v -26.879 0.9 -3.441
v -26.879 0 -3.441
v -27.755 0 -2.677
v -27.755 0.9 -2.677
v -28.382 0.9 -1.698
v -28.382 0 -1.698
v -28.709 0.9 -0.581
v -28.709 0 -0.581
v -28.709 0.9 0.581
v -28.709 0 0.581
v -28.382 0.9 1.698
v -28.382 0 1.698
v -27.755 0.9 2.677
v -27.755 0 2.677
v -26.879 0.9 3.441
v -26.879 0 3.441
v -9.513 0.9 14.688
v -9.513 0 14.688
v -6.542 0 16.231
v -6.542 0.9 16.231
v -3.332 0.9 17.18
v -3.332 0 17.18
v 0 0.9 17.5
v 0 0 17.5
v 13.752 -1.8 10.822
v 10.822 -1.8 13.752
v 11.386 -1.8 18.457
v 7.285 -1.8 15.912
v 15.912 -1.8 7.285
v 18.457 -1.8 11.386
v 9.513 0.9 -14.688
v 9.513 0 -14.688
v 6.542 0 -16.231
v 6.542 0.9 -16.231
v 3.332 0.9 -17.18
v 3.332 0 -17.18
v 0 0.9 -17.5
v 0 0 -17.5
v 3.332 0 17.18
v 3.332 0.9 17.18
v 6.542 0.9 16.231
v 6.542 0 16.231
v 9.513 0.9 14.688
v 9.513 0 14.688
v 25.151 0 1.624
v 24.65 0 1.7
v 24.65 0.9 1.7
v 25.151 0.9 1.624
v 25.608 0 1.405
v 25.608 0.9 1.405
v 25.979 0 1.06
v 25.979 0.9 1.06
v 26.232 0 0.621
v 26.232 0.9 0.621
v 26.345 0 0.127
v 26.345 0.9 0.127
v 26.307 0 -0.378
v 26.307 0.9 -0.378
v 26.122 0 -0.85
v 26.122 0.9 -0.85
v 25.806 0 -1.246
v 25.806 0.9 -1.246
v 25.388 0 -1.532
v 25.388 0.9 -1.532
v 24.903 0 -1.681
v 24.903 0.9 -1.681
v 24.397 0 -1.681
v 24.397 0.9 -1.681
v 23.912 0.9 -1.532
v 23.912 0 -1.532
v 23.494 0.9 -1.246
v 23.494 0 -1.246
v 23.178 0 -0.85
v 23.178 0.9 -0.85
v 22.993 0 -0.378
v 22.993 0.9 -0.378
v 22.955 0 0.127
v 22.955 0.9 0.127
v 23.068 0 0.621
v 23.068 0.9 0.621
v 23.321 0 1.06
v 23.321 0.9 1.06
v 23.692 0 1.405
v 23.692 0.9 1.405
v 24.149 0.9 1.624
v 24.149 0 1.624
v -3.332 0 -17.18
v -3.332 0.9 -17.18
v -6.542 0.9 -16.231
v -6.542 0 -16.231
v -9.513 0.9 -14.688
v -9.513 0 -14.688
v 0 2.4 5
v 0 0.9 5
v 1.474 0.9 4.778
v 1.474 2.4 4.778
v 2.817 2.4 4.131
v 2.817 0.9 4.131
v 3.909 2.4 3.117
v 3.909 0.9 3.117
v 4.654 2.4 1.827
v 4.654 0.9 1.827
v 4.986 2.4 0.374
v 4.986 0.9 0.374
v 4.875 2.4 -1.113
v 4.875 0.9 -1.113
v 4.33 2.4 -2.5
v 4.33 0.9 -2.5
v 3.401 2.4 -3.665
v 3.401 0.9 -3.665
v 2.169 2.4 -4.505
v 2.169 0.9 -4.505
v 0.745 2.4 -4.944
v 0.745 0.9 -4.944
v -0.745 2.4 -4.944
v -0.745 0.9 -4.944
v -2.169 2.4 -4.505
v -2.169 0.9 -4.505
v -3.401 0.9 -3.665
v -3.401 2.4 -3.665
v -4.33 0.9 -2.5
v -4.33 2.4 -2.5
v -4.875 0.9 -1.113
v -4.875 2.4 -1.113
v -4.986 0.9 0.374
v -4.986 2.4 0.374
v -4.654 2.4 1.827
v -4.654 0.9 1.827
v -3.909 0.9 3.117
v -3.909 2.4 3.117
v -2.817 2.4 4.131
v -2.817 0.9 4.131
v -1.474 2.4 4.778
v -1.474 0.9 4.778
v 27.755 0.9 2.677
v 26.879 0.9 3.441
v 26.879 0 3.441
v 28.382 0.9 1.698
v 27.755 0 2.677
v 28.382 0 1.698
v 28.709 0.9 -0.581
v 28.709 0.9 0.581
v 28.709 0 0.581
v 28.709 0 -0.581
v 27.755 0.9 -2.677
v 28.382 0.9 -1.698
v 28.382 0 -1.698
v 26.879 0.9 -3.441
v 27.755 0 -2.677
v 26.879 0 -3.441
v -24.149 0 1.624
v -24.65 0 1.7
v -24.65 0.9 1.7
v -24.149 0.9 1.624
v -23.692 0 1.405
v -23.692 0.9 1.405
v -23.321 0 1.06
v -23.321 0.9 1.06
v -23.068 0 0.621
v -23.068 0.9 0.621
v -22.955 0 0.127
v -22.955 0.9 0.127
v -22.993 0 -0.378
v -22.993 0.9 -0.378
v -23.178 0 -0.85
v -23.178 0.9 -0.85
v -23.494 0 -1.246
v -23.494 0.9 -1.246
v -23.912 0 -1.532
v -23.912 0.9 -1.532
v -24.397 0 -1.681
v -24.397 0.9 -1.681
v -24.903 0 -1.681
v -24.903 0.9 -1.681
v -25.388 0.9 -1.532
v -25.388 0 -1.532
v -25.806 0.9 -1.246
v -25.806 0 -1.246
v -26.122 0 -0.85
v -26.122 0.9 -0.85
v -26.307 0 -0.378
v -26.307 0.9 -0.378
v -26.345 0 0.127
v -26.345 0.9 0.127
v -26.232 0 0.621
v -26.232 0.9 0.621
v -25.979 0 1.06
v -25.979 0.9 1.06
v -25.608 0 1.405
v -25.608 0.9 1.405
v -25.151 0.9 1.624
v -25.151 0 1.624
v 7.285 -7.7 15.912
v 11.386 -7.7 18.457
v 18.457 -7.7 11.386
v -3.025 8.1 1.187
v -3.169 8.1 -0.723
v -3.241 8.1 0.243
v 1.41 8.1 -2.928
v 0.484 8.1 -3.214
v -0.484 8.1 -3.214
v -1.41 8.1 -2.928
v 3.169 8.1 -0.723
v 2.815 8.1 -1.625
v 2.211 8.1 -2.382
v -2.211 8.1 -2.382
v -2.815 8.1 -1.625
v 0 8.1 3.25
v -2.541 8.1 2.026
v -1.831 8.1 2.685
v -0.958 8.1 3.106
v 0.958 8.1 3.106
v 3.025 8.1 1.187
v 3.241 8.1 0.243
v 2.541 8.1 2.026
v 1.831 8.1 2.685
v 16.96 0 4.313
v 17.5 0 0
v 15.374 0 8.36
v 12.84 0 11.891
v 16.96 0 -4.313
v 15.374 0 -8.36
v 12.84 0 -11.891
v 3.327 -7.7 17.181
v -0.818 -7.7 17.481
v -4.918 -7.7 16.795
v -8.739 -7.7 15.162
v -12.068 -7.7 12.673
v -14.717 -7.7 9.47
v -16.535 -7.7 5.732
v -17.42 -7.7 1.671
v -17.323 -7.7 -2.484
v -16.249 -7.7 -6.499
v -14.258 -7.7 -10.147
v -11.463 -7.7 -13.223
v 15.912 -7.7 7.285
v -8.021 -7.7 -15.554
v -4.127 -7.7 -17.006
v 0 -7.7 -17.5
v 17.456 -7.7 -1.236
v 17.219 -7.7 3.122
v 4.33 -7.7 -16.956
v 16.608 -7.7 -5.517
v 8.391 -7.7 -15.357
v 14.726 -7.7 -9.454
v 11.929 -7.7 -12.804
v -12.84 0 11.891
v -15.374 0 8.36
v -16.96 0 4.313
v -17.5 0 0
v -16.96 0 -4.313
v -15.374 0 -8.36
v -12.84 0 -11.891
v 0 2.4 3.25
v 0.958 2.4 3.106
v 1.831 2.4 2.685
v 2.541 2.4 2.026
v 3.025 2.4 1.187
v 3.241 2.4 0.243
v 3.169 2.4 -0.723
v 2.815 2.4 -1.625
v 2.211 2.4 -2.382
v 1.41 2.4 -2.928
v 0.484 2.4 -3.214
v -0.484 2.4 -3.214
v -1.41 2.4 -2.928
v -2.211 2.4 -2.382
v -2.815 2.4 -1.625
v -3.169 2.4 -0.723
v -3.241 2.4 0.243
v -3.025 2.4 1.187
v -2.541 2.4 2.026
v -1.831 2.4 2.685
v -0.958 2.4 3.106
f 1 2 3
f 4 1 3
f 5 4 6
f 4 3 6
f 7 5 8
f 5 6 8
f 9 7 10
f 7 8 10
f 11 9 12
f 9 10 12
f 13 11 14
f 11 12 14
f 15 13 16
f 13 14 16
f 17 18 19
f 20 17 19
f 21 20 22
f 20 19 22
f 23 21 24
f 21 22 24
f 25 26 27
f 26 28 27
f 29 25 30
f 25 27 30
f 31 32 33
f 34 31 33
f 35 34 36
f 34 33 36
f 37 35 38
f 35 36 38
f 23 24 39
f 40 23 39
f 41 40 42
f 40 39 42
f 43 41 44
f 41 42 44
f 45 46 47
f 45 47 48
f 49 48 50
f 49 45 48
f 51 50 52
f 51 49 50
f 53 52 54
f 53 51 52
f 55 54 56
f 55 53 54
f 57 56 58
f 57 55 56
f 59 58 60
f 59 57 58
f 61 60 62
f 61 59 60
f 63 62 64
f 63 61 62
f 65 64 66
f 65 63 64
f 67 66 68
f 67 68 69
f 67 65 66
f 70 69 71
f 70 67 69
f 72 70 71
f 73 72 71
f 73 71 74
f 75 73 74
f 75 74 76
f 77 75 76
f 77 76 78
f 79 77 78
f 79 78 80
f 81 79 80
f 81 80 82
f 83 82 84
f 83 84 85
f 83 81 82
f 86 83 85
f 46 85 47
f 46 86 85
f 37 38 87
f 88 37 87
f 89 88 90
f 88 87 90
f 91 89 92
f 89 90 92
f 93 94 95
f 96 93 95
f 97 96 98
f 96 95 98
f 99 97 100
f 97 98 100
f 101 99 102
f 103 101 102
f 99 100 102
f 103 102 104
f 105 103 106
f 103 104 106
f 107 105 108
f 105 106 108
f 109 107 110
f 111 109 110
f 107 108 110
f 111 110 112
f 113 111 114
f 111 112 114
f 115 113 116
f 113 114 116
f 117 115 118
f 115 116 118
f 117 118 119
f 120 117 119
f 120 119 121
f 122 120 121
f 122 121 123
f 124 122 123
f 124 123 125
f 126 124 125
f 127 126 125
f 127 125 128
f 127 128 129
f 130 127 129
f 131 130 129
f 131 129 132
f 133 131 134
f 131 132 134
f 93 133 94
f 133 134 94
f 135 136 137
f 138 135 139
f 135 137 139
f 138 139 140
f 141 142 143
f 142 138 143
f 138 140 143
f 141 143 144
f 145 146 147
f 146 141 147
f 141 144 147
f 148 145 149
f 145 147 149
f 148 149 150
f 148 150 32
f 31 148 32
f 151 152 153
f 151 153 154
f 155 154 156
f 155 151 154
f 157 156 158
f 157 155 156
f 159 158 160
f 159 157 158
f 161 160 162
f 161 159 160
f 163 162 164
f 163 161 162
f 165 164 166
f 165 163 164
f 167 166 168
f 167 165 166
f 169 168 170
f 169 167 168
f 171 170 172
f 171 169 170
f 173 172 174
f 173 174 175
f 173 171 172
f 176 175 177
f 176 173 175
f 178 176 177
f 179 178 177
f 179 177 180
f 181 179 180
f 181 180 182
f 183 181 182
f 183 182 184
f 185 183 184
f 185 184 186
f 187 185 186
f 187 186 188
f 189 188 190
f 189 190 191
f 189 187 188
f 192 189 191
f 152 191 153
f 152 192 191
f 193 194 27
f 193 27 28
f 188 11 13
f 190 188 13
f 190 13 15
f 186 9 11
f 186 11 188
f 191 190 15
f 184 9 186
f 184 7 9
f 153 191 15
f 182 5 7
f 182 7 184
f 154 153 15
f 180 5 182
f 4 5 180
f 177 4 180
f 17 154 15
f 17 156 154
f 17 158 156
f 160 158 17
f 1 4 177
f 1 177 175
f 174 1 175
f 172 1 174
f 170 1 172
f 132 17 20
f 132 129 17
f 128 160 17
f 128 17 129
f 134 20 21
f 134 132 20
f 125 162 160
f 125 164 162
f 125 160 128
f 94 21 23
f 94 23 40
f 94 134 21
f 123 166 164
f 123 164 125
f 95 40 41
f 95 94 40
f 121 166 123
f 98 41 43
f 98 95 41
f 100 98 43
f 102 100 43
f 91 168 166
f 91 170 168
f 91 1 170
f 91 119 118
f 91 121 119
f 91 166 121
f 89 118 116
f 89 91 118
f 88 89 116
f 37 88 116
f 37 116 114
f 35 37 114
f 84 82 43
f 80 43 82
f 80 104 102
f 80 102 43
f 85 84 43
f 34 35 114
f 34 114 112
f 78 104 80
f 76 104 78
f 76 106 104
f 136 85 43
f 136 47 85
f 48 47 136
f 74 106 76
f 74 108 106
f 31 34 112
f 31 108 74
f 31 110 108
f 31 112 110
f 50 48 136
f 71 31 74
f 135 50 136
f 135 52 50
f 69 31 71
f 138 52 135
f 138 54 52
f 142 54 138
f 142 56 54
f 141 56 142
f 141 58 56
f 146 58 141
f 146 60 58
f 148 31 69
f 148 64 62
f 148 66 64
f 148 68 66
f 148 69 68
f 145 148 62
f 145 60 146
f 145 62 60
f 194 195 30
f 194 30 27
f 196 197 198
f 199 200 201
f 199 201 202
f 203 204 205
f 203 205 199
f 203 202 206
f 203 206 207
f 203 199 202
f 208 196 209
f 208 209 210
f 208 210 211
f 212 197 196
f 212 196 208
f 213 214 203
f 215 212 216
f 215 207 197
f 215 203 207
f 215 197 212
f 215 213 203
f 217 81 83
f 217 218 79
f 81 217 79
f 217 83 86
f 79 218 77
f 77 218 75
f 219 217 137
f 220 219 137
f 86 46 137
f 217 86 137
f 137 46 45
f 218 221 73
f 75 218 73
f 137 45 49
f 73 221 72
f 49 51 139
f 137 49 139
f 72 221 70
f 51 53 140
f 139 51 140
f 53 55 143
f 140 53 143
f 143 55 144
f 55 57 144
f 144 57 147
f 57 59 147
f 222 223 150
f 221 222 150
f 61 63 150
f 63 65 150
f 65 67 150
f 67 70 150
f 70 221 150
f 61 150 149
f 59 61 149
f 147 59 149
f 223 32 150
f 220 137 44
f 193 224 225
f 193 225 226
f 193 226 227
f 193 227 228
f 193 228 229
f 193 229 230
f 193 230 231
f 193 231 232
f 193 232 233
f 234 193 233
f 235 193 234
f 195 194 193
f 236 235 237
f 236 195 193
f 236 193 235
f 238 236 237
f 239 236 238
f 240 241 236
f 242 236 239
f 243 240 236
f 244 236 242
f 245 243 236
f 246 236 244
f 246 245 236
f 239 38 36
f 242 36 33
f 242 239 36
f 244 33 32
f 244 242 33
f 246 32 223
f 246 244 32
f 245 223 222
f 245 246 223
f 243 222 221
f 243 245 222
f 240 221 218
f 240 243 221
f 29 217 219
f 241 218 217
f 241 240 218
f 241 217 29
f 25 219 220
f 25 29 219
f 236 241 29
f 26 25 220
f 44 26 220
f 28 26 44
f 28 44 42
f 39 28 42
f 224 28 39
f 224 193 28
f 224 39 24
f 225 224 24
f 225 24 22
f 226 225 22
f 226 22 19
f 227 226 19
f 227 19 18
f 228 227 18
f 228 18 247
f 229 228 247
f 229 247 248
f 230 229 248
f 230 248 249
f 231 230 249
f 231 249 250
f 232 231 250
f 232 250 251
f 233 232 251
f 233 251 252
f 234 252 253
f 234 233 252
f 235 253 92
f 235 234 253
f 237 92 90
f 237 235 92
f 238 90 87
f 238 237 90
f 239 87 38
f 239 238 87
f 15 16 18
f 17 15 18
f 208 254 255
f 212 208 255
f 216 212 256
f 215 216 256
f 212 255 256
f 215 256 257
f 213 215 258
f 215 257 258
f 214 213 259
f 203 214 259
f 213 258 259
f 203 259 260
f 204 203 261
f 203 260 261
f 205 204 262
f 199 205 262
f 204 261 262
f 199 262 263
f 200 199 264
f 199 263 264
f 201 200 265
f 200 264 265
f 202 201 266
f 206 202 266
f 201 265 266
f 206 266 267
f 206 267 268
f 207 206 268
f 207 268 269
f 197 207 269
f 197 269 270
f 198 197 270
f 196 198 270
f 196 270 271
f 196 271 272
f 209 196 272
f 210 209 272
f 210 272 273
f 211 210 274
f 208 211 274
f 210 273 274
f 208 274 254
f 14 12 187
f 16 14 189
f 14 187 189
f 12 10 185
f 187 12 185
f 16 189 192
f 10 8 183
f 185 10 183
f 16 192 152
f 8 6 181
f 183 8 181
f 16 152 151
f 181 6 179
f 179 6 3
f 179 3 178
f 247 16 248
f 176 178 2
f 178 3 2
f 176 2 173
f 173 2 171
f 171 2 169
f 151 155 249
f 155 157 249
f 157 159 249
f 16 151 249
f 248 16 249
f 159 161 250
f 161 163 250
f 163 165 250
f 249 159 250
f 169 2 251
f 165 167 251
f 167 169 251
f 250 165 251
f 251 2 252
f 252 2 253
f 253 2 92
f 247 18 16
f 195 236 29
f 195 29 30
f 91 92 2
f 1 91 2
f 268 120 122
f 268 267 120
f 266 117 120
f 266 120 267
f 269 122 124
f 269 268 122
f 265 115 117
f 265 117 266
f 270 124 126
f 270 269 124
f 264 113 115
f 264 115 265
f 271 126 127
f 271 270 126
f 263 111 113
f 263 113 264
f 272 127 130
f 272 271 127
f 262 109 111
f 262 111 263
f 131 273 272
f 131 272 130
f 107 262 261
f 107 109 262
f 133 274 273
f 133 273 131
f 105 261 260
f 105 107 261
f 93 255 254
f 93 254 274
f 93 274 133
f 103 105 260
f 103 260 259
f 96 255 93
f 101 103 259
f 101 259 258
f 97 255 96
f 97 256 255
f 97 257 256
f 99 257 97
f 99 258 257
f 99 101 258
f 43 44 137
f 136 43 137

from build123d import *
from build123d.topology import SkipClean

# Parameters (mm, degrees)
SKETCH1_R      = 4.1
SKETCH1_R_2    = 1.7
EXTRUDE1_DEPTH = 0.9
EXTRUDE2_START = 7.7
SKETCH2_R      = 17.5
EXTRUDE2_DEPTH = 7.7
SKETCH3_R      = 5
EXTRUDE3_DEPTH = 1.5
SKETCH4_R      = 3.25
EXTRUDE4_DEPTH = 5.7
EXTRUDE5_DEPTH = 5.9


with BuildPart() as part:
    # Sketch1 → Extrude1 (new body)
    # profile 1 of 8: a face of its own
    with BuildSketch(Plane(origin=(0, 0, 0), x_dir=(1, 0, 0), z_dir=(0, 1, 0))):
        with BuildLine():
            ThreePointArc((-9.513184584, -14.688407642), (-17.5, 0), (-9.513184584, 14.688407642))
            Line((-9.513184584, 14.688407642), (-26.878803245, 3.441284076))
            ThreePointArc((-26.878803245, 3.441284076), (-22.691441002, 3.601950396), (-20.55, 0))
            ThreePointArc((-20.55, 0), (-22.691441002, -3.601950396), (-26.878803245, -3.441284076))
            Line((-26.878803245, -3.441284076), (-9.513184584, -14.688407642))
        make_face()
    # profile 2 of 8: a face of its own
    with BuildSketch(Plane(origin=(0, 0, 0), x_dir=(1, 0, 0), z_dir=(0, 1, 0))):
        with Locations((-24.65, 0)):
            Circle(SKETCH1_R)
        with Locations(Location((-24.65, 0, 0), (0, 0, 270))):
            Circle(SKETCH1_R_2, mode=Mode.SUBTRACT)
    # profile 3 of 8: a face of its own
    with BuildSketch(Plane(origin=(0, 0, 0), x_dir=(1, 0, 0), z_dir=(0, 1, 0))):
        with BuildLine():
            ThreePointArc((9.513184584, 14.688407642), (4.959983178, 16.782388593), (0, 17.5))
            Line((0, 17.5), (0, -17.5))
            ThreePointArc((0, -17.5), (4.959983178, -16.782388593), (9.513184584, -14.688407642))
            ThreePointArc((9.513184584, -14.688407642), (15.374178518, -8.359703038), (17.5, 0))
            ThreePointArc((17.5, 0), (15.374178518, 8.359703038), (9.513184584, 14.688407642))
        make_face()
    # profile 4 of 8: a face of its own
    with BuildSketch(Plane(origin=(0, 0, 0), x_dir=(1, 0, 0), z_dir=(0, 1, 0))):
        with BuildLine():
            Line((0, -17.5), (0, 17.5))
            ThreePointArc((0, 17.5), (-4.959983178, 16.782388593), (-9.513184584, 14.688407642))
            ThreePointArc((-9.513184584, 14.688407642), (-17.5, 0), (-9.513184584, -14.688407642))
            ThreePointArc((-9.513184584, -14.688407642), (-4.959983178, -16.782388593), (0, -17.5))
        make_face()
    # profile 5 of 8: a face of its own
    with BuildSketch(Plane(origin=(0, 0, 0), x_dir=(1, 0, 0), z_dir=(0, 1, 0))):
        with BuildLine():
            ThreePointArc((9.513184584, 14.688407642), (4.959983178, 16.782388593), (0, 17.5))
            Line((0, 17.5), (0, -17.5))
            ThreePointArc((0, -17.5), (4.959983178, -16.782388593), (9.513184584, -14.688407642))
            ThreePointArc((9.513184584, -14.688407642), (15.374178518, -8.359703038), (17.5, 0))
            ThreePointArc((17.5, 0), (15.374178518, 8.359703038), (9.513184584, 14.688407642))
        make_face()
    # profile 6 of 8: a face of its own
    with BuildSketch(Plane(origin=(0, 0, 0), x_dir=(1, 0, 0), z_dir=(0, 1, 0))):
        with BuildLine():
            Line((0, -17.5), (0, 17.5))
            ThreePointArc((0, 17.5), (-4.959983178, 16.782388593), (-9.513184584, 14.688407642))
            ThreePointArc((-9.513184584, 14.688407642), (-17.5, 0), (-9.513184584, -14.688407642))
            ThreePointArc((-9.513184584, -14.688407642), (-4.959983178, -16.782388593), (0, -17.5))
        make_face()
    # profile 7 of 8: a face of its own
    with BuildSketch(Plane(origin=(0, 0, 0), x_dir=(1, 0, 0), z_dir=(0, 1, 0))):
        with BuildLine():
            Line((26.878803245, 3.441284076), (9.513184584, 14.688407642))
            ThreePointArc((9.513184584, 14.688407642), (15.374178518, 8.359703038), (17.5, 0))
            ThreePointArc((17.5, 0), (15.374178518, -8.359703038), (9.513184584, -14.688407642))
            Line((9.513184584, -14.688407642), (26.878803245, -3.441284076))
            ThreePointArc((26.878803245, -3.441284076), (20.55, 0), (26.878803245, 3.441284076))
        make_face()
    # profile 8 of 8: a face of its own
    with BuildSketch(Plane(origin=(0, 0, 0), x_dir=(1, 0, 0), z_dir=(0, 1, 0))):
        with Locations((24.65, 0)):
            Circle(SKETCH1_R)
        with Locations(Location((24.65, 0, 0), (0, 0, 270))):
            Circle(SKETCH1_R_2, mode=Mode.SUBTRACT)
    extrude(amount=EXTRUDE1_DEPTH)

    # Sketch2 → Extrude2 (add)
    with SkipClean():  # the faces are left unmerged after this step: merging them gives an invalid solid
        with BuildSketch(Plane.XZ.offset(EXTRUDE2_START)):
            with Locations(Location((0, 0, 0), (0, 0, 270))):
                Circle(SKETCH2_R)
        extrude(amount=-EXTRUDE2_DEPTH)

    # Sketch3 → Extrude3 (add)
    with SkipClean():  # the faces are left unmerged after this step: merging them gives an invalid solid
        with BuildSketch(Plane(origin=(0, 0.9, 0), x_dir=(1, 0, 0), z_dir=(0, 1, 0))):
            with Locations(Location((0, 0, 0), (0, 0, 270))):
                Circle(SKETCH3_R)
        extrude(amount=EXTRUDE3_DEPTH)

    # Sketch4 → Extrude4 (add)
    with SkipClean():  # the faces are left unmerged after this step: merging them gives an invalid solid
        with BuildSketch(Plane(origin=(0, 2.4, 0), x_dir=(1, 0, 0), z_dir=(0, 1, 0))):
            with Locations(Location((0, 0, 0), (0, 0, 270))):
                Circle(SKETCH4_R)
        extrude(amount=EXTRUDE4_DEPTH)

    # Sketch5 → Extrude5 (add)
    with BuildSketch(Plane.XZ.offset(7.7)):
        Polygon((7.284924369, 15.911627099), (15.911627099, 7.284924369), (18.457211511, 11.3861437), (11.3861437, 18.457211511), align=None)
    extrude(amount=-EXTRUDE5_DEPTH)


solid = part.part
